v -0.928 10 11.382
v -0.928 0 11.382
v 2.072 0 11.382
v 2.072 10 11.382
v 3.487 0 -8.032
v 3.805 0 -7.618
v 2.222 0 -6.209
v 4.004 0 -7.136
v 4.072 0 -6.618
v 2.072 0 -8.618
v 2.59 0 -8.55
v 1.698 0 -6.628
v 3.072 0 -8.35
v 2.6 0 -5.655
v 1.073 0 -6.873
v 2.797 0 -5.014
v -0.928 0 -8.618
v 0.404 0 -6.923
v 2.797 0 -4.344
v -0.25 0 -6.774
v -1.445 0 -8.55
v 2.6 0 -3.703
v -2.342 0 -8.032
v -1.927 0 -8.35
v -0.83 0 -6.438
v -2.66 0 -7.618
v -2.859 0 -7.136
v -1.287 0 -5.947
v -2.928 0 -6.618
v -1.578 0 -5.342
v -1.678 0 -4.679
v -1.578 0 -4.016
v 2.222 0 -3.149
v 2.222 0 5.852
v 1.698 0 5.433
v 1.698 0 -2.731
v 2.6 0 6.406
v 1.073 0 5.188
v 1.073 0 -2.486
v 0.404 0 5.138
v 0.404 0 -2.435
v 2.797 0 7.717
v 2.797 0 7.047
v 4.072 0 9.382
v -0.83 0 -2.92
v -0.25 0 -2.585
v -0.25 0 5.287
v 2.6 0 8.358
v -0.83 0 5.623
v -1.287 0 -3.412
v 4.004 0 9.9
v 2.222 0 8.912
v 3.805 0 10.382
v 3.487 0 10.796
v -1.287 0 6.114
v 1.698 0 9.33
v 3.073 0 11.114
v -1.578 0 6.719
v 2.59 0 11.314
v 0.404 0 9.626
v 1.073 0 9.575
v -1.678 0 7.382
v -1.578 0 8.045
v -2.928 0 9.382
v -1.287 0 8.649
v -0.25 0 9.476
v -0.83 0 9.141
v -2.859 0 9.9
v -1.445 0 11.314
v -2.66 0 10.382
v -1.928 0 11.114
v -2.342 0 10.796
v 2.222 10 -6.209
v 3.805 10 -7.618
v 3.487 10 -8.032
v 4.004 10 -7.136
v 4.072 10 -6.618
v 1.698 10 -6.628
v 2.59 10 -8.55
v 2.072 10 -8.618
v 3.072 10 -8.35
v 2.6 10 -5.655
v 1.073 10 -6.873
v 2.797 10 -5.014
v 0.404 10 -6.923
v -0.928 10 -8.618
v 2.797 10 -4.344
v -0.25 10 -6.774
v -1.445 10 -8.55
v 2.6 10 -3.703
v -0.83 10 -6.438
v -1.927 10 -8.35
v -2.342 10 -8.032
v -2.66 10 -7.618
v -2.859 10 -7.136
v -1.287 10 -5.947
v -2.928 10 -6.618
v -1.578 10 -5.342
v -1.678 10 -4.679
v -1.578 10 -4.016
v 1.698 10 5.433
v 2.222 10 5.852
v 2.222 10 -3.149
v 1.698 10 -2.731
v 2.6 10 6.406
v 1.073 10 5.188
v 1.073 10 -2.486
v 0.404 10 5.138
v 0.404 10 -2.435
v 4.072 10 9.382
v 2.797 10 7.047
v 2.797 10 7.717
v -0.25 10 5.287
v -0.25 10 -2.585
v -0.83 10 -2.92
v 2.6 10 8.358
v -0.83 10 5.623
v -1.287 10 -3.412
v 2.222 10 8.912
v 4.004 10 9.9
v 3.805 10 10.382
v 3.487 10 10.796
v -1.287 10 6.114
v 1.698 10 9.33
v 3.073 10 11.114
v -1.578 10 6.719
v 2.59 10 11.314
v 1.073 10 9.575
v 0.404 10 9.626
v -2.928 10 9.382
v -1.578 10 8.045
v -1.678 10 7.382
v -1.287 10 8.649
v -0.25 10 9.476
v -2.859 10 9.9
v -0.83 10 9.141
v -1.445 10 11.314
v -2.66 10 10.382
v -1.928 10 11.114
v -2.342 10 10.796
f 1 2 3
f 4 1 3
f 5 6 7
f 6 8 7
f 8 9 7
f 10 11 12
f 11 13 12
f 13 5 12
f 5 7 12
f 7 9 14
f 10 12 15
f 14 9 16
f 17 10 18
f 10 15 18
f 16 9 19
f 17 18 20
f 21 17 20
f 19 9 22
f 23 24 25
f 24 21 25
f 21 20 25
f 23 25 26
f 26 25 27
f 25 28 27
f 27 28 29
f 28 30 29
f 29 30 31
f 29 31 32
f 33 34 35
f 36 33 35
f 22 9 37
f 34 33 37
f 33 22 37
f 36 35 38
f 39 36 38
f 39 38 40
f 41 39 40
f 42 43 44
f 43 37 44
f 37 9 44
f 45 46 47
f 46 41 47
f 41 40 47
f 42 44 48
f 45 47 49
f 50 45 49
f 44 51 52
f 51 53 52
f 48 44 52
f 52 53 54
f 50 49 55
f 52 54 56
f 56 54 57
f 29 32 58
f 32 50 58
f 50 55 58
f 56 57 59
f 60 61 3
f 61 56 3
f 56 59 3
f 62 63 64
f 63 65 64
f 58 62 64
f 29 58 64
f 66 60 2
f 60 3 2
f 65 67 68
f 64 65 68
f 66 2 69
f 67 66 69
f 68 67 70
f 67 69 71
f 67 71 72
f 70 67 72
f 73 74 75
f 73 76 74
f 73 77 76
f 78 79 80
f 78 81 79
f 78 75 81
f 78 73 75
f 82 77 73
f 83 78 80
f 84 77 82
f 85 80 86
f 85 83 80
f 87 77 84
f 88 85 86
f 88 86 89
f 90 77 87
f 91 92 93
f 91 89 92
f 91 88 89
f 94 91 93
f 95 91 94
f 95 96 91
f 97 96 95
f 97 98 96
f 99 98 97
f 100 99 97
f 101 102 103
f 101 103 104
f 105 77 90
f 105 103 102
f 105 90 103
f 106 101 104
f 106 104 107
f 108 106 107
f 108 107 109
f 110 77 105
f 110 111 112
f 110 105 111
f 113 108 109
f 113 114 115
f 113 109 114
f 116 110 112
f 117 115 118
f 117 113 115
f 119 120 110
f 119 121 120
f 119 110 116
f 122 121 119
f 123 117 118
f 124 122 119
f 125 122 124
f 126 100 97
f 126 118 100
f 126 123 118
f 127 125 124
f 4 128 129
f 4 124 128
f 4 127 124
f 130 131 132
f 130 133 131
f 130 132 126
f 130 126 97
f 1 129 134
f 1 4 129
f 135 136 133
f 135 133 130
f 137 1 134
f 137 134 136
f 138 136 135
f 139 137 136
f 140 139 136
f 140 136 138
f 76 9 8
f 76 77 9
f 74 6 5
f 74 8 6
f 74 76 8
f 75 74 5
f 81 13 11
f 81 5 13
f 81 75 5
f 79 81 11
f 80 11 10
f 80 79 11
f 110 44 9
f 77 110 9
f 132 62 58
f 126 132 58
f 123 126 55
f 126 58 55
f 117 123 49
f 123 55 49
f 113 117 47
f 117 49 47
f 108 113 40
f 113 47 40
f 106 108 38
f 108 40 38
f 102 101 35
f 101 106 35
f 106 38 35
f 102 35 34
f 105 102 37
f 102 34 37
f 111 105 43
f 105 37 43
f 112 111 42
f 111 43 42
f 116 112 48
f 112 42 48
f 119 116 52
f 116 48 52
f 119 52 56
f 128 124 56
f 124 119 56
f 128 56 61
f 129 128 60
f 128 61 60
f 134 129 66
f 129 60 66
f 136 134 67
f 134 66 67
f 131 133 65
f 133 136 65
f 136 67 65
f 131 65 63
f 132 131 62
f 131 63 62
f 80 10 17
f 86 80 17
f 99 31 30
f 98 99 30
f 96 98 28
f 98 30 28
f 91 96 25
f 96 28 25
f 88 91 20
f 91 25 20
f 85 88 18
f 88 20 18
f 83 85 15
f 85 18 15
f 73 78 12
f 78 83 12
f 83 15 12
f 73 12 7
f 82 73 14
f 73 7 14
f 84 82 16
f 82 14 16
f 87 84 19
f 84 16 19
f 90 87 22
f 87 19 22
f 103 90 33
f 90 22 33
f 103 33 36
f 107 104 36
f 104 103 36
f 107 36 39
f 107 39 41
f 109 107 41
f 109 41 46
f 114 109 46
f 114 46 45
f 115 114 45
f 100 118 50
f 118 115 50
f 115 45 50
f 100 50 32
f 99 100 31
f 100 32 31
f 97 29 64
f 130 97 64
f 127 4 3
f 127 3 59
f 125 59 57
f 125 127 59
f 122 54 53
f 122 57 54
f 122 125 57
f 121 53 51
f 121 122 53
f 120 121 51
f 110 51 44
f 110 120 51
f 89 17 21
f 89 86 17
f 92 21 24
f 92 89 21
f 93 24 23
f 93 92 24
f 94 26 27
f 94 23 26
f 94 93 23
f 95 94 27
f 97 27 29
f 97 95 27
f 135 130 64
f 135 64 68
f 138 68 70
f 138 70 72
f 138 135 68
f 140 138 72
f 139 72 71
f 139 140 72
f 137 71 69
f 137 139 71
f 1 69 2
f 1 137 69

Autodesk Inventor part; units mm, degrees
ref_plane "YZ Plane" through (0, 0, 0) normal (1, 0, 0) x (0, 1, 0)
ref_plane "XZ Plane" through (0, 0, 0) normal (0, 1, 0) x (-1, 0, 0)
ref_plane "XY Plane" through (0, 0, 0) normal (0, 0, 1) x (1, 0, 0)
sketch "Sketch1" plane through (0, 0, 0) normal (0, 1, 0) x (-1, 0, 0)
  circle A0 centre (-0.5725, 7.3819) radius 2.25
  circle A1 centre (-0.5725, -4.6791) radius 2.25
  line L0 (2.9275, 11.3819) -> (-4.0725, 11.3819)
  line L1 (-4.0725, 11.3819) -> (-4.0725, -8.6181)
  line L2 (-4.0725, -8.6181) -> (2.9275, -8.6181)
  line L3 (2.9275, -8.6181) -> (2.9275, 11.3819)
  point P0 (0, 0)
  dimension "d0" = 4.5
  dimension "d1" = 4.5
  dimension "d2" = 12.061
  dimension "d3" = 7
  dimension "d4" = 3.5
  dimension "d5" = 20
  dimension "d6" = 4
extrude "Extrusion1" add sketch "Sketch1" along normal blind 10
fillet "Fillet1" radius 2 4 edges at (-2.9275, 5, 11.3819) (4.0725, 5, 11.3819) (4.0725, 5, -8.6181) (-2.9275, 5, -8.6181)
properties part number "Aparter"
